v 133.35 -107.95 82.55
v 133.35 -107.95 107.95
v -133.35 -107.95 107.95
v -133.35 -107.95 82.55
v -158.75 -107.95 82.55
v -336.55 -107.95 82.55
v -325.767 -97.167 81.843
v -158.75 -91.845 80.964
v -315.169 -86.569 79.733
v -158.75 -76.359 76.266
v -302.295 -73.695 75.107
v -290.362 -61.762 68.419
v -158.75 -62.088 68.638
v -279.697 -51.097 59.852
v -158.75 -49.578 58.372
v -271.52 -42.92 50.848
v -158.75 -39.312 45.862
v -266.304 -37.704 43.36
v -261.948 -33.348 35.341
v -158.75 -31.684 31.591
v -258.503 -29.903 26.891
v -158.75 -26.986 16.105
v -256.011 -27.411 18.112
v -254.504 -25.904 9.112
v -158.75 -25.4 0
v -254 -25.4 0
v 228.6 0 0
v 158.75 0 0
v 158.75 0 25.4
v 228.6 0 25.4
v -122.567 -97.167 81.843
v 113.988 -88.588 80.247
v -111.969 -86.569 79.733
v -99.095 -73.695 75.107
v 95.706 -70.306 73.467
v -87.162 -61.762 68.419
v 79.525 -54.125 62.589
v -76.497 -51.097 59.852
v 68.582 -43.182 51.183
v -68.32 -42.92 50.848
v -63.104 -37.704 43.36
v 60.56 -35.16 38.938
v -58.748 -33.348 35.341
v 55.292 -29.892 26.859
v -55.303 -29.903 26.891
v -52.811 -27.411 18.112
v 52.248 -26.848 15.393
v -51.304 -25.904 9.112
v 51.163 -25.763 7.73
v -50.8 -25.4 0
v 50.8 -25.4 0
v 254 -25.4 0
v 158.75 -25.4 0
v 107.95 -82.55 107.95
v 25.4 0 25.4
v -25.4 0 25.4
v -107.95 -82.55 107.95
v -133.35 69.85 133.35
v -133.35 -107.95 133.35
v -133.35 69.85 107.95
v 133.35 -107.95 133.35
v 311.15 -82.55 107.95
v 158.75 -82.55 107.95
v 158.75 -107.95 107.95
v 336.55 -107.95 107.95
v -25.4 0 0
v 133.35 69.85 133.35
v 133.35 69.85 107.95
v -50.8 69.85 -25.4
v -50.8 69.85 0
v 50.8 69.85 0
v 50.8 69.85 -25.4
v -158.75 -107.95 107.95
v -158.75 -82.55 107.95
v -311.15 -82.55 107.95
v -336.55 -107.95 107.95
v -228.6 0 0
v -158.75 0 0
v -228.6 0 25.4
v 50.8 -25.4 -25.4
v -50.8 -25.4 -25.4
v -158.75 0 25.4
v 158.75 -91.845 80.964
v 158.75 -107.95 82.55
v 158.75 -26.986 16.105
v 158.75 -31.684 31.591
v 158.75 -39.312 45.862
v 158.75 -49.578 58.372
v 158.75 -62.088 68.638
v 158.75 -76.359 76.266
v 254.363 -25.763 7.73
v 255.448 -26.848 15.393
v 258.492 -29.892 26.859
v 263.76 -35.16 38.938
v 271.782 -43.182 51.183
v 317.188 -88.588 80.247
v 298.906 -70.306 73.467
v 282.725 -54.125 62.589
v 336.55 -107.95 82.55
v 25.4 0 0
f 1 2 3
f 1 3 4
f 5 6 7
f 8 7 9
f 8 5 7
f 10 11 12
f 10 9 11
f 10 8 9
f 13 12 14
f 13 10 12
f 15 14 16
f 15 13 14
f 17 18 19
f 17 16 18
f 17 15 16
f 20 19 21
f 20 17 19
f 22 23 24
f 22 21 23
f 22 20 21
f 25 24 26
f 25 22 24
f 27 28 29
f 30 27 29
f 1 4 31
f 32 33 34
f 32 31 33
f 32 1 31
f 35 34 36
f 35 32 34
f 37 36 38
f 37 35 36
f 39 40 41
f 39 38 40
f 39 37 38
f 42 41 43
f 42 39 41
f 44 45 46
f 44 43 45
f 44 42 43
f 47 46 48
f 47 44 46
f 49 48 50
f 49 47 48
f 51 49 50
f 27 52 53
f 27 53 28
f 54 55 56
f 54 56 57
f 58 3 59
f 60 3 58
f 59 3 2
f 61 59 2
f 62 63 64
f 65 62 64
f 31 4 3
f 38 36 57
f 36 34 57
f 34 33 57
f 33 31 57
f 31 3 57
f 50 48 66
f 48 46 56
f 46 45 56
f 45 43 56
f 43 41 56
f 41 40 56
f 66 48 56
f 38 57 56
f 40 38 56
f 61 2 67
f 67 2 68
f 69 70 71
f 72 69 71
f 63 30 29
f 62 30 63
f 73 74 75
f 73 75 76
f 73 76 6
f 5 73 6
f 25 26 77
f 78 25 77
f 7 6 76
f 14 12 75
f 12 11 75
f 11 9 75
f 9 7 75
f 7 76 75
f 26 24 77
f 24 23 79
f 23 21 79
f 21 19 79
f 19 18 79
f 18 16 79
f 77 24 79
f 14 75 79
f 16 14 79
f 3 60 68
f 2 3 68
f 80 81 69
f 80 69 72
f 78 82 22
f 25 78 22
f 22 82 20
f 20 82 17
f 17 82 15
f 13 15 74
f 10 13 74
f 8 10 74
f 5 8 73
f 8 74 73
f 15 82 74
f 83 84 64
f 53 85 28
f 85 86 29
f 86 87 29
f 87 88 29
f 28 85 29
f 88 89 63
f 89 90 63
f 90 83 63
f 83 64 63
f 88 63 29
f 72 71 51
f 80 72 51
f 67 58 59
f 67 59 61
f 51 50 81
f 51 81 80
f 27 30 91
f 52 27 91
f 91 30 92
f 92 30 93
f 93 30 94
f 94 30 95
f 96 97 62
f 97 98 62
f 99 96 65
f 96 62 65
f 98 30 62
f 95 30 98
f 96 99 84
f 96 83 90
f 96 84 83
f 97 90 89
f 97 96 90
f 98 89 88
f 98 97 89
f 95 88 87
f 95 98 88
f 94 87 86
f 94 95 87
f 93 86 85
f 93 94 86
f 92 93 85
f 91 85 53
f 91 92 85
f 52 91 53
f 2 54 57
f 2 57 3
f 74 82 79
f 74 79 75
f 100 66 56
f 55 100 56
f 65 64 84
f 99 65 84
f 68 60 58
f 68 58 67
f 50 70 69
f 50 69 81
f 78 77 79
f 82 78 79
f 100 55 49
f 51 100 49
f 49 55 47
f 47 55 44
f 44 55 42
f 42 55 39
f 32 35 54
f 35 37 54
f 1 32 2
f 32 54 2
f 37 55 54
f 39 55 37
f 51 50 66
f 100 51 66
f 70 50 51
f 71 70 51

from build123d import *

# Parameters (mm, degrees)
F1_DEPTH = 336.55
F3_DEPTH = 107.951
F4_W     = 101.6
F4_H     = 95.25
F5_DEPTH = 25.4
F6_W     = 266.7
F6_H     = 177.8
F7_DEPTH = 25.4


with BuildPart() as f1:
    # F0 (on Right) → F1 (new body, symmetric)
    with BuildSketch(Plane.YZ):
        with BuildLine():
            Line((-25.4, 0), (0, 0))
            Line((0, 0), (0, 25.4))
            Line((0, 25.4), (-82.55, 107.95))
            Line((-82.55, 107.95), (-107.95, 107.95))
            Line((-107.95, 107.95), (-107.95, 82.55))
            ThreePointArc((-107.95, 82.55), (-49.578335, 58.371665), (-25.4, 0))
        make_face()
    extrude(amount=F1_DEPTH, both=True)

    # F2 (on face) → F3 (cut, through all)
    with BuildSketch(Plane.XY.offset(107.95)):
        Polygon((-336.55, 0), (-336.55, -107.95), (-228.6, 0), align=None)
        Polygon((228.6, 0), (336.55, -107.95), (336.55, 0), align=None)
        Polygon((-25.4, 0), (-158.75, 0), (-158.75, -107.95), (-133.35, -107.95), align=None)
        Polygon((158.75, -107.95), (158.75, 0), (25.4, 0), (133.35, -107.95), align=None)
    extrude(amount=-F3_DEPTH, mode=Mode.SUBTRACT)


with BuildPart() as f5:
    # F4 (on face) → F5 (new body)
    with BuildSketch(Plane(origin=(0, 0, 0), x_dir=(1, 0, 0), z_dir=(0, 0, -1))):
        with Locations((0, -22.225)):
            Rectangle(F4_W, F4_H)
    extrude(amount=F5_DEPTH)


with BuildPart() as f7:
    # F6 (on face) → F7 (new body)
    with BuildSketch(Plane.XY.offset(107.95)):
        with Locations((0, -19.05)):
            Rectangle(F6_W, F6_H)
    extrude(amount=F7_DEPTH)


solid = Compound([f1.part, f5.part, f7.part])
